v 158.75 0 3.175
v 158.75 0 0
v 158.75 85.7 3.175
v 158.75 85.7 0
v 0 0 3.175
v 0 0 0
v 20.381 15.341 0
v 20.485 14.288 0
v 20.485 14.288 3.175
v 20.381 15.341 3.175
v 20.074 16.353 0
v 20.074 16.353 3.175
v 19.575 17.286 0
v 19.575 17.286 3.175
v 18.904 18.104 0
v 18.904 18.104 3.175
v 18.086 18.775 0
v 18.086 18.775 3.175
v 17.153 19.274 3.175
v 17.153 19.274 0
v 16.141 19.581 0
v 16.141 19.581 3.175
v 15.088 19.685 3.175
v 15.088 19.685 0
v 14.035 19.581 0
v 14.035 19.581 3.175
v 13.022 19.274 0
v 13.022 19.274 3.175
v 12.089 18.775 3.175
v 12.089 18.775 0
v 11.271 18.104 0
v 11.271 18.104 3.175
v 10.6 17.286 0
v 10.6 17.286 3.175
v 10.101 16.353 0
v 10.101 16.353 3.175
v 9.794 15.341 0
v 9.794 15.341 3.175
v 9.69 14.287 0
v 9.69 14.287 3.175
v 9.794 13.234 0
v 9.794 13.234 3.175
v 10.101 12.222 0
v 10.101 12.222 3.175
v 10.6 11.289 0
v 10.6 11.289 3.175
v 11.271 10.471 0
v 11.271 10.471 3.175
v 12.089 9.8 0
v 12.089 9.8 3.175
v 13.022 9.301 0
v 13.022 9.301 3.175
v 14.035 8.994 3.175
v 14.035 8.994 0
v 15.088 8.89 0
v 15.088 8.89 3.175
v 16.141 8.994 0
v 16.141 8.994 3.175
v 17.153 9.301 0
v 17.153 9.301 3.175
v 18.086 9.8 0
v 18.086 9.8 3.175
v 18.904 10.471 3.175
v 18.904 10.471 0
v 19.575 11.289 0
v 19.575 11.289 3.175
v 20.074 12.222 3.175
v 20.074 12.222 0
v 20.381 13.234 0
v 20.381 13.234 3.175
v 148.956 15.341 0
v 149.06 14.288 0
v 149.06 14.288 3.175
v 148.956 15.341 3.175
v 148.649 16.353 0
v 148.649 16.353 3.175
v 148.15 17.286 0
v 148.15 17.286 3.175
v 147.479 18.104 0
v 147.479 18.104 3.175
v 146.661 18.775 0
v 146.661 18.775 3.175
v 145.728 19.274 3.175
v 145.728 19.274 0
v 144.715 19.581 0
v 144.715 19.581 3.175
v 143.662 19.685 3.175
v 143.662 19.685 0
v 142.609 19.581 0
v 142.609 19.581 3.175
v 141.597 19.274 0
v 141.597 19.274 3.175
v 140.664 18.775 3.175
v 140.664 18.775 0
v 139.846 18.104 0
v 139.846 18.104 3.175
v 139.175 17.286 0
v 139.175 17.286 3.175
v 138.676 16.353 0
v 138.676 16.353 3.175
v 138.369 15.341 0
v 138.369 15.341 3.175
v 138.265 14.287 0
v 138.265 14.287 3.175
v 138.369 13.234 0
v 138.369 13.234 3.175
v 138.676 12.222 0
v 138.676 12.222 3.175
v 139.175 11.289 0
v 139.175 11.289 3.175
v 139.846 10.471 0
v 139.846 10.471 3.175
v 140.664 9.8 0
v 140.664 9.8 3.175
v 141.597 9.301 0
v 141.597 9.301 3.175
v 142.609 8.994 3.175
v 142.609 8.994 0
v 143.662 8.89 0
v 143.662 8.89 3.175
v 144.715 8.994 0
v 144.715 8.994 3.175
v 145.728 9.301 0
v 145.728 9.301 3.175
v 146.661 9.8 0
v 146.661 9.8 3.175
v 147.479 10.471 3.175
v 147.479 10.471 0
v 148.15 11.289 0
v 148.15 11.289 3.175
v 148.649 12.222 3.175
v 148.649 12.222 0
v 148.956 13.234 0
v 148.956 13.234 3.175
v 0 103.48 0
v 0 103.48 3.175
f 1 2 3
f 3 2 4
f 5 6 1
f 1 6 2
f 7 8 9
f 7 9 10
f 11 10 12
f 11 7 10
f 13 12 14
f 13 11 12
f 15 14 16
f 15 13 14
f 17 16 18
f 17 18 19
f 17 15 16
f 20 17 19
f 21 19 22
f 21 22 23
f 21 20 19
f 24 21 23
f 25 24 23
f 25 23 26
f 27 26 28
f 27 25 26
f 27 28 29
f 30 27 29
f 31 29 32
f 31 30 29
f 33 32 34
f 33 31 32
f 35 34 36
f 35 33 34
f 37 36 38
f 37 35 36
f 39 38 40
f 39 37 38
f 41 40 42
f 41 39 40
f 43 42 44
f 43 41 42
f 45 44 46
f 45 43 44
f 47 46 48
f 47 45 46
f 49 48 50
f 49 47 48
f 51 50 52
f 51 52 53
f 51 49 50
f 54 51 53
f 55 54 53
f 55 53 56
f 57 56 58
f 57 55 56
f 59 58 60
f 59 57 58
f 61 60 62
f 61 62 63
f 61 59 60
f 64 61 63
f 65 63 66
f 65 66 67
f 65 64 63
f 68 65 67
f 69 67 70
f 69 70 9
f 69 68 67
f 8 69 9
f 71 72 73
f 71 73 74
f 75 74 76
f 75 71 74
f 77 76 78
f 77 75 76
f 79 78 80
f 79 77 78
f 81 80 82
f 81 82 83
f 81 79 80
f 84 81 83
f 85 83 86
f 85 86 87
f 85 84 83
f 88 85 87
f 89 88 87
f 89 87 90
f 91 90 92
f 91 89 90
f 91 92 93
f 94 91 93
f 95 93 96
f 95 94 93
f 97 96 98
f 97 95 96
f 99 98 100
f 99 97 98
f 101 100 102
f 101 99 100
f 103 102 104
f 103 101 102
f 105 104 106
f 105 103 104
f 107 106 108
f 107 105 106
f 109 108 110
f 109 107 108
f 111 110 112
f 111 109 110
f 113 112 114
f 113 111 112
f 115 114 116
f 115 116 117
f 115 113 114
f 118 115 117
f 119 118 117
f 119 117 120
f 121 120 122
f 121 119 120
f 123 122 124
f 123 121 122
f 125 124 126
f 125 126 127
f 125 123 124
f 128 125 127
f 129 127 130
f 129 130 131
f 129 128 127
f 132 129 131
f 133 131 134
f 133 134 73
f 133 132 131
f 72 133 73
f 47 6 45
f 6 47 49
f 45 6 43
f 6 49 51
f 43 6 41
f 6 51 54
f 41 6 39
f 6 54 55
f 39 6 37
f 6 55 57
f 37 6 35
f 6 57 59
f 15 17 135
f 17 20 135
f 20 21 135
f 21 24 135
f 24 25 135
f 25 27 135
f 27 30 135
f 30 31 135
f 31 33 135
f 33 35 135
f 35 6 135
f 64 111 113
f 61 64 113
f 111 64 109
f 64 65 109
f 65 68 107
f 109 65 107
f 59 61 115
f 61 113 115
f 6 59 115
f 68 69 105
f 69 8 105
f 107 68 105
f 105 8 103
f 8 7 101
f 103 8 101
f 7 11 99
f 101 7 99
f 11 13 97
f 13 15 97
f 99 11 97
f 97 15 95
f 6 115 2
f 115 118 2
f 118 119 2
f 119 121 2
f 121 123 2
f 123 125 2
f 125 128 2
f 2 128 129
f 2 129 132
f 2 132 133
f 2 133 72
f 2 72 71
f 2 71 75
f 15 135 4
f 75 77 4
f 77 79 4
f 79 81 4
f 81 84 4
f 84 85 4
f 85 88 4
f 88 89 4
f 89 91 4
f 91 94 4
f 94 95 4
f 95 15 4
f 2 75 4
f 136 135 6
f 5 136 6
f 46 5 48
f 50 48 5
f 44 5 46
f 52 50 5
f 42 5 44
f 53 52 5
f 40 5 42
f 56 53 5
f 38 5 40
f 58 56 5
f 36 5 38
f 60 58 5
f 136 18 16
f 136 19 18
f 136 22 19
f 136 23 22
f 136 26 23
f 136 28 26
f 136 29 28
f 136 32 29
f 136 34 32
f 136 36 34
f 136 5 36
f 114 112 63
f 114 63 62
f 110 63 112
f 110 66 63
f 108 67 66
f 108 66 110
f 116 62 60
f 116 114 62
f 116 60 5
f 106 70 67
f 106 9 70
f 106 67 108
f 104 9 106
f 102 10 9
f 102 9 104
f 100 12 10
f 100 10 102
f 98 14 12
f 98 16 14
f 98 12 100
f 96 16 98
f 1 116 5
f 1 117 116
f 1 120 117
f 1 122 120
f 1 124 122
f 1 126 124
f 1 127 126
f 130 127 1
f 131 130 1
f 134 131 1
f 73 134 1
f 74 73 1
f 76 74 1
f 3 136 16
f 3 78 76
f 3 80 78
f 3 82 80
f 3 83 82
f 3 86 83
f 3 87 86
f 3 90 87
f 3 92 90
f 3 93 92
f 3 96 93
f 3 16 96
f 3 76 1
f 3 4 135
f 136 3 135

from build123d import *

# Parameters (mm, degrees)
F0_W     = 158.75
F0_H     = 65.0748
F0_R     = 5.3975
F1_DEPTH = 3.175


with BuildPart() as f1:
    # F0 (on Top) → F1 (new body)
    with BuildSketch(Plane.XY):
        with Locations((79.375, 32.5374)):
            Rectangle(F0_W, F0_H)
        with Locations((15.0876, 14.2875)):
            Circle(F0_R, mode=Mode.SUBTRACT)
        with Locations((143.6624, 14.2875)):
            Circle(F0_R, mode=Mode.SUBTRACT)
        Polygon((0, 103.4796), (0, 65.0748), (158.75, 65.0748), (158.75, 85.6996), align=None)
    extrude(amount=F1_DEPTH)


solid = f1.part
